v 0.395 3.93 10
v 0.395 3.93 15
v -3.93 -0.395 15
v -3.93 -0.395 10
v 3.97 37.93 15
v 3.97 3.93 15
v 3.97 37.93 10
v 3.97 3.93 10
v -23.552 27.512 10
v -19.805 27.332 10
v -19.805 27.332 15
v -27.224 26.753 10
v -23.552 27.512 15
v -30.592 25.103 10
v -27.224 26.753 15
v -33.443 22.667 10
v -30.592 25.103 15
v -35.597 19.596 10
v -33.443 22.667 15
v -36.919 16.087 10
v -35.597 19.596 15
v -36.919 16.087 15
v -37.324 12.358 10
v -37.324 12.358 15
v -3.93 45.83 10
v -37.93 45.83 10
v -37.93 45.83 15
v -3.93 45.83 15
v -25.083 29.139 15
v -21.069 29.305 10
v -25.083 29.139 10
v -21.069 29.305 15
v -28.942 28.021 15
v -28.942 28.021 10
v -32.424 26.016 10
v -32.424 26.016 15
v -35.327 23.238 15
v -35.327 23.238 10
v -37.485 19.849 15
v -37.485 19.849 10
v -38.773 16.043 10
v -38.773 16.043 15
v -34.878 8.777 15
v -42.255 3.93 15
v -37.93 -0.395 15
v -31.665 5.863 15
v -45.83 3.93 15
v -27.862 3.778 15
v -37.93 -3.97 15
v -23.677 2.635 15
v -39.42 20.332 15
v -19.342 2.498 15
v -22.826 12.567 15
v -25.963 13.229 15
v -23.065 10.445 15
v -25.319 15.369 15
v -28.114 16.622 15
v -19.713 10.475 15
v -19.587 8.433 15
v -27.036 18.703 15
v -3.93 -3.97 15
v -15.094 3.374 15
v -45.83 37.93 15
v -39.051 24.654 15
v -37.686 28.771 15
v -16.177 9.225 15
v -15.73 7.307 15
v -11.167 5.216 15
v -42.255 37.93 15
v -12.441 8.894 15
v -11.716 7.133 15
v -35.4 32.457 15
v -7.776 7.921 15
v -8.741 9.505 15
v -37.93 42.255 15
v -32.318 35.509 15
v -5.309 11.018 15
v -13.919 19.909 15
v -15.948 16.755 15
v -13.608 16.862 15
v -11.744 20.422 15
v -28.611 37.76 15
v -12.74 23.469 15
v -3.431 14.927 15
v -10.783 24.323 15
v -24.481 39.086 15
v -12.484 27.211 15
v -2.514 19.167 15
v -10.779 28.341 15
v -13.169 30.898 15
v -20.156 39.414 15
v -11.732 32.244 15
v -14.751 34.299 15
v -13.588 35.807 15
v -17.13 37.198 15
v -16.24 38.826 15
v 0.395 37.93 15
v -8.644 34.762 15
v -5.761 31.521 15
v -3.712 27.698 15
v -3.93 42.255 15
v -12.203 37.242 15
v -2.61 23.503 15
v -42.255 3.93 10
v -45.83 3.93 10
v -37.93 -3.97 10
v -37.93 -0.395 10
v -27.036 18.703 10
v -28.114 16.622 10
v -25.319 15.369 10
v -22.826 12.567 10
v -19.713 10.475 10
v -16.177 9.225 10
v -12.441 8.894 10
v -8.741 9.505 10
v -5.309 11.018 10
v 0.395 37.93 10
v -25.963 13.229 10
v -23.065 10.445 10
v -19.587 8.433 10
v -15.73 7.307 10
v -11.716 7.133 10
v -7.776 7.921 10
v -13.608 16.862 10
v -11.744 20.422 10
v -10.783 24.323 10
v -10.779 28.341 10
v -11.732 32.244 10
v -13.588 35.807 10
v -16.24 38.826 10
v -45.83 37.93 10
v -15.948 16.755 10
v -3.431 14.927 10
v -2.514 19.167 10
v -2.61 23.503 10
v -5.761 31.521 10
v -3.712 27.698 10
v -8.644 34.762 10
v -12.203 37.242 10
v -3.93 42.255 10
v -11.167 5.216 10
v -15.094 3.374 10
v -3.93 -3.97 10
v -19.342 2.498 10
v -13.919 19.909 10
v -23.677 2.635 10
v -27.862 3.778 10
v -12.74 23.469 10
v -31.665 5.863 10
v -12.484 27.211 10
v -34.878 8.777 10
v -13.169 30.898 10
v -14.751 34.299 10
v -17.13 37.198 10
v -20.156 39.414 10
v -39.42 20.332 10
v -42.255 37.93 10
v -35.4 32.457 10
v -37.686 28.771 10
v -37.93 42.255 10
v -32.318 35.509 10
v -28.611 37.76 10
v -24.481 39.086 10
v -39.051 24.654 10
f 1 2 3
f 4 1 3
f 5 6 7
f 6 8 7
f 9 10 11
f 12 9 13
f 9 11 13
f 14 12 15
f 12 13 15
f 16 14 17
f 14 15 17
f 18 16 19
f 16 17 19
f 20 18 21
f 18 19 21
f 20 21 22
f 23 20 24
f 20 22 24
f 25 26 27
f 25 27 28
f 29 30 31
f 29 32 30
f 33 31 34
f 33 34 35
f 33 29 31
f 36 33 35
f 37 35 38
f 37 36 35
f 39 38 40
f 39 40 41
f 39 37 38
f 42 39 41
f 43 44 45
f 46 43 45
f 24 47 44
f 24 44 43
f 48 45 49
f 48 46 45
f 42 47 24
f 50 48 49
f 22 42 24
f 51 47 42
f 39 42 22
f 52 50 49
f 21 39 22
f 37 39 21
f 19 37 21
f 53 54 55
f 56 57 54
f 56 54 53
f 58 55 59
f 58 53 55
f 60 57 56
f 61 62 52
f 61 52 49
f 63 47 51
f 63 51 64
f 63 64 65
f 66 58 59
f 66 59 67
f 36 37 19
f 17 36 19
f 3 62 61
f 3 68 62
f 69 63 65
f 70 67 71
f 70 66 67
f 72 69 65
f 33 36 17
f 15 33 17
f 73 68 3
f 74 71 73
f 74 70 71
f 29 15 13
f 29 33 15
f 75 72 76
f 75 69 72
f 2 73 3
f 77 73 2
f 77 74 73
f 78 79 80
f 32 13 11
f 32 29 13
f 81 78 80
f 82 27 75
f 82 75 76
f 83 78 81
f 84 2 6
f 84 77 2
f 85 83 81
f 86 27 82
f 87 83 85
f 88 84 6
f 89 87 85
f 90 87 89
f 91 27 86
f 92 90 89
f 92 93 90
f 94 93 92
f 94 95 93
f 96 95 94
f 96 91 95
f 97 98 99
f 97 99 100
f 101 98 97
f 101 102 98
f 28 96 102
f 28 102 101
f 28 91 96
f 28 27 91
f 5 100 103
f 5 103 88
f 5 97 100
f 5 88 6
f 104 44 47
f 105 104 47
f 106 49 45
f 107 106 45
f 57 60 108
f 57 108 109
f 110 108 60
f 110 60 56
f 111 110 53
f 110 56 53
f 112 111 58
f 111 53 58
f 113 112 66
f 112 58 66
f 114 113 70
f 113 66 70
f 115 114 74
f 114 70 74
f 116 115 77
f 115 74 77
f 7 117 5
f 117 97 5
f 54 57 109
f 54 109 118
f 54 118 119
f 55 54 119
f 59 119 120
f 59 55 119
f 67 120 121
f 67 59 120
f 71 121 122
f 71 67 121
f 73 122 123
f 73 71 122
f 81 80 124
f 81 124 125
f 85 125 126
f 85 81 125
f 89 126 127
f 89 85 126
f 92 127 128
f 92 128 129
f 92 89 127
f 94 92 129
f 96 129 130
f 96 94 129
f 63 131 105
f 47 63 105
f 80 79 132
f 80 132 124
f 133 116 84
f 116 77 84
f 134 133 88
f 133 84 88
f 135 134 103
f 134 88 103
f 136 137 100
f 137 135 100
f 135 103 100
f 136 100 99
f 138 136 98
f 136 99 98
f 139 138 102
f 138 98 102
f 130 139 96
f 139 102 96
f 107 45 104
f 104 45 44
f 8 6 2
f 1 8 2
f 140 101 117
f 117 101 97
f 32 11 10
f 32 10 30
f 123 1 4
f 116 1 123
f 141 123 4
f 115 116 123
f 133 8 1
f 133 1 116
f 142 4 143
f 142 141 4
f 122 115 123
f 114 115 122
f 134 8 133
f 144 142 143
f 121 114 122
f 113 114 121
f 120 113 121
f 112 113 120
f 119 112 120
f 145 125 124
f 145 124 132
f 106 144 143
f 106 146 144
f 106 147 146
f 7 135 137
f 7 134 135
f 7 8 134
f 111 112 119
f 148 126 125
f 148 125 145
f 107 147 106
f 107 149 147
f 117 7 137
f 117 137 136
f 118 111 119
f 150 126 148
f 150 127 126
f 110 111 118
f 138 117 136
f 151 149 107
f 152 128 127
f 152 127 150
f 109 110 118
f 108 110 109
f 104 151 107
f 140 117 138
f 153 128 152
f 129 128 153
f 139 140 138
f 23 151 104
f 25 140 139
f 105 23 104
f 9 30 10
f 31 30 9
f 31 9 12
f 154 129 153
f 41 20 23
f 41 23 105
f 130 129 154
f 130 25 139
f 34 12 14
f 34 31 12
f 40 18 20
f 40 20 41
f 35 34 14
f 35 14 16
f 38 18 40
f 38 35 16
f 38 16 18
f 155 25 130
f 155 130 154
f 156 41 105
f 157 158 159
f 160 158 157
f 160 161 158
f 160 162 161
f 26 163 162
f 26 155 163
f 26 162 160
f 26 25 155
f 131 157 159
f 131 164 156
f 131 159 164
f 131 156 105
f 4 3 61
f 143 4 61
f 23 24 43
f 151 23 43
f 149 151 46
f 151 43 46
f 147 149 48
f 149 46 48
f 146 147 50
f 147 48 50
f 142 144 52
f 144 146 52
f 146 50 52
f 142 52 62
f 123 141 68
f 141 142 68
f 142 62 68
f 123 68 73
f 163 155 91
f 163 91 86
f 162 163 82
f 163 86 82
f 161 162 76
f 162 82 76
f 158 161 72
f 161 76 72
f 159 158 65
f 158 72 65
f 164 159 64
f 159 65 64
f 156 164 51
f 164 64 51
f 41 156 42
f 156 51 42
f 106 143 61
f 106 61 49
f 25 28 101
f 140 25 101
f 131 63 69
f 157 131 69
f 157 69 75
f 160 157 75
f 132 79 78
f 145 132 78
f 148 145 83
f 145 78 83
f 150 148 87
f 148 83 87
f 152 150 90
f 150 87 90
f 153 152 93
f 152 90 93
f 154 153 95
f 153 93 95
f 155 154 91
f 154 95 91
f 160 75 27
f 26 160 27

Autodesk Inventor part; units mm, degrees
ref_plane "YZ Plane" through (0, 0, 0) normal (1, 0, 0) x (0, 1, 0)
ref_plane "Work Plane1" through (0, 0, 10) normal (0, 0, 1) x (1, 0, 0)
sketch "Sketch1" plane through (0, 0, 10) normal (0, 0, 1) x (1, 0, 0)
  line L0 (-4.0299, -0.3538) -> (-2.2322, 1.4439) construction
  arc A0 (-1.4439, 2.2322) -> (-2.2322, 1.4439) centre (-0.9299, 0.9299) ccw construction
  line L1 (-1.4439, 2.2322) -> (0.3538, 4.0299) construction
  line L2 (-37.8299, 42.2137) -> (-37.8299, 45.8299) construction
  line L3 (-37.8299, 45.8299) -> (-4.0299, 45.8299) construction
  line L4 (-4.0299, 45.8299) -> (-4.0299, 42.2137) construction
  line L5 (-4.0299, 4.0299) -> (0.3538, 4.0299) projected
  line L6 (-20.9299, 58.9723) -> (17.1124, 20.9299) construction
  line L7 (17.1124, 20.9299) -> (-20.9299, -17.1124) construction
  line L8 (-20.9299, -17.1124) -> (-58.9723, 20.9299) construction
  line L9 (-58.9723, 20.9299) -> (-20.9299, 58.9723) construction
  line L10 (-20.9299, 58.9723) -> (-20.9299, -17.1124) construction
  line L11 (17.1124, 20.9299) -> (-58.9723, 20.9299) construction
  line L12 (-20.9299, 58.9723) -> (32.8701, 58.9723) construction
  line L13 (-43.4299, 43.4299) -> (1.5701, 43.4299) construction
  line L14 (1.5701, 43.4299) -> (1.5701, -1.5701) construction
  line L15 (1.5701, -1.5701) -> (-43.4299, -1.5701) construction
  line L16 (-43.4299, -1.5701) -> (-43.4299, 43.4299) construction
  line L17 (-43.4299, 43.4299) -> (1.5701, -1.5701) construction
  line L18 (1.5701, 43.4299) -> (-43.4299, -1.5701) construction
  line L19 (-43.4299, 5.3876) -> (-43.4299, 36.4723)
  line L20 (-43.4299, 36.4723) -> (-36.4723, 43.4299)
  line L21 (-36.4723, 43.4299) -> (-5.3876, 43.4299)
  line L22 (-5.3876, 43.4299) -> (1.5701, 36.4723)
  line L23 (1.5701, 36.4723) -> (1.5701, 5.3876)
  line L24 (1.5701, 5.3876) -> (-5.3876, -1.5701)
  line L25 (-5.3876, -1.5701) -> (-36.4723, -1.5701)
  line L26 (-36.4723, -1.5701) -> (-43.4299, 5.3876)
  line L27 (-4.0299, 42.2137) -> (-37.8299, 42.2137) projected
  line L28 (-4.0299, -0.3538) -> (-4.0299, 4.0299) projected
  circle A1 centre (-20.9299, 20.9299) radius 13.3985
  circle A2 centre (-20.9299, 20.9299) radius 15.4895
  point P0 (-37.8299, 4.0299)
  dimension "d18" = 53.8
  dimension "d19" = 45
  dimension "d20" = 53.8
  dimension "d21" = 45
  dimension "d22" = 45
  dimension "d30" = 26.797
  dimension "d36" = 30.979
extrude "Extrusion1" add sketch "Sketch1" along normal blind 5 contours L28 L24 L25 L26 L19 L20 L27 L22 L23 L5 | L5 L24 L28 | L27 L20 L21 L22 | A1 | A2
ref_plane "Work Plane2" through (-40.9959, 0.8639, 22.2359) normal (0, 0, 1) x (1, 0, 0)
sketch "Sketch3" plane through (0, 0, 10) normal (0, 0, -1) x (-1, 0, 0)
  line L0 (37.8299, -0.4701) -> (37.8299, 4.0299) construction
  line L1 (4.0299, 4.0299) -> (4.0299, -0.4701) construction
  line L2 (37.8299, -0.4701) -> (37.8299, 1.1886) construction
  line L3 (4.0299, -3.9701) -> (4.0299, -0.3538) construction
  line L4 (45.8299, 4.0299) -> (42.2137, 4.0299) construction
  line L5 (-0.3538, 4.0299) -> (-3.9701, 4.0299) construction
  line L6 (-3.9701, 37.8299) -> (-0.3538, 37.8299) construction
  line L7 (4.0299, 42.2137) -> (4.0299, 45.8299) construction
  line L8 (37.8299, 45.8299) -> (37.8299, 42.2137) construction
  line L9 (42.2137, 37.8299) -> (45.8299, 37.8299) construction
  line L10 (37.8299, 37.7299) -> (45.8299, 37.7299)
  line L11 (45.8299, 37.7299) -> (45.8299, 4.1299)
  line L12 (45.8299, 4.1299) -> (37.8299, 4.1299)
  line L13 (37.8299, 4.1299) -> (37.8299, 37.7299)
  line L14 (37.7299, 4.0299) -> (4.1299, 4.0299)
  line L15 (4.1299, 4.0299) -> (4.1299, -3.9701)
  line L16 (4.1299, -3.9701) -> (37.7299, -3.9701)
  line L17 (37.7299, -3.9701) -> (37.7299, 4.0299)
  line L18 (4.0299, 4.1299) -> (-3.9701, 4.1299)
  line L19 (-3.9701, 4.1299) -> (-3.9701, 37.7299)
  line L20 (-3.9701, 37.7299) -> (4.0299, 37.7299)
  line L21 (4.0299, 37.7299) -> (4.0299, 4.1299)
  line L22 (4.1299, 37.8299) -> (37.7299, 37.8299)
  line L23 (37.7299, 37.8299) -> (37.7299, 45.8299)
  line L24 (37.7299, 45.8299) -> (4.1299, 45.8299)
  line L25 (4.1299, 45.8299) -> (4.1299, 37.8299)
  point P0 (0, 0)
  dimension "d23" = 0.1
  dimension "d24" = 0.1
  dimension "d25" = 0.1
  dimension "d26" = 0.1
  dimension "d27" = 0.1
extrude "Extrusion3" add sketch "Sketch3" against normal up to surface (5 mm away)
sketch "Sketch6" plane through (0, 0, 15) normal (0, 0, 1) x (1, 0, 0)
  circle A0 centre (-20.9299, 20.9299) radius 18.5
  circle A1 centre (-20.9299, 20.9299) radius 13.3985
  line L0 (-45.8299, 4.1299) -> (-45.8299, 37.7299) projected
  line L1 (-4.1299, -3.9701) -> (-37.7299, -3.9701) projected
  line L2 (-37.7299, 45.8299) -> (-4.1299, 45.8299) projected
  point P0 (0, 0)
  point P1 (-45.8299, 20.9299)
  point P2 (-20.9299, -3.9701)
  point P3 (-20.9299, 45.8299)
  dimension "d37" = 26.797
  dimension "d38" = 37
extrude "Extrusion5" cut sketch "Sketch6" against normal blind 12 contours A0 | A1
sketch "Sketch7" plane through (0, 0, 15) normal (0, 0, 1) x (1, 0, 0)
  arc A0 (-7.3514, 4.1907) -> (-4.1915, 7.0829) centre (-15.9478, 16.7551) ccw
  arc A1 (-7.3514, 4.1907) -> (-4.1915, 7.0829) centre (-15.9478, 16.7551) ccw
  circle A2 centre (-20.9299, 20.9299) radius 18.5 construction
  circle A3 centre (-20.9299, 20.9299) radius 6.5 construction
  arc A4 (-15.9478, 16.7551) -> (-20.1559, 39.4137) centre (-27.3968, 26.3489) ccw
  arc A5 (-13.6076, 16.8625) -> (-16.2405, 38.8257) centre (-27.3968, 26.3489) ccw
  arc A6 (-16.2405, 38.8257) -> (-20.1559, 39.4137) centre (-20.9299, 20.9299) ccw
  line L0 (-15.9478, 16.7551) -> (-13.6076, 16.8625)
  point P0 (0, 0)
  point P1 (-25.3654, 35.7708)
  point P2 (-14.2, -44.8454)
  point P3 (-13.5804, 16.4347)
  point P4 (-13.5804, 8.5029)
  dimension "d79" = 13
  dimension "d83" = 1.8
extrude "Extrusion6" add sketch "Sketch7" against normal up to surface (5 mm away)
pattern_circular "Circular Pattern1" count 3 over 360 about axis through (-20.9299, 20.9299, 15) along (0, 0, -1) of "Extrusion6"
sketch "Skizze11" plane through (0, 0, 15) normal (0, 0, 1) x (1, 0, 0)
  arc A0 (-5.3095, 11.0177) -> (-16.2405, 38.8257) centre (-20.9299, 20.9299) ccw construction
  arc A1 (-27.0364, 18.7027) -> (-5.3095, 11.0177) centre (-13.0035, 23.8209) ccw construction
  line L0 (-28.1135, 16.6223) -> (-27.0364, 18.7027) construction
  arc A2 (-28.1135, 16.6223) -> (-7.7764, 7.9209) centre (-13.0035, 23.8209) ccw construction
  arc A3 (-37.3244, 12.3584) -> (-7.7764, 7.9209) centre (-20.9299, 20.9299) ccw construction
  arc A4 (-19.8055, 27.3319) -> (-37.3244, 12.3584) centre (-22.3895, 12.6199) ccw construction
  line L1 (-21.0686, 29.3049) -> (-19.8055, 27.3319) construction
  arc A5 (-21.0686, 29.3049) -> (-38.7728, 16.0432) centre (-22.3895, 12.6199) ccw construction
  arc A6 (-20.1559, 39.4137) -> (-38.7728, 16.0432) centre (-20.9299, 20.9299) ccw construction
  arc A7 (-15.9478, 16.7551) -> (-20.1559, 39.4137) centre (-27.3968, 26.3489) ccw construction
  line L2 (-13.6076, 16.8625) -> (-15.9478, 16.7551) construction
  arc A8 (-13.6076, 16.8625) -> (-16.2405, 38.8257) centre (-27.3968, 26.3489) ccw construction
  line L3 (3.9701, 4.1299) -> (0.3124, 4.1299) projected
  line L4 (3.9701, 37.7299) -> (3.9701, 4.1299) construction
  line L5 (0.3124, 37.7299) -> (3.9701, 37.7299) projected
  line L6 (0.3124, 37.7299) -> (-4.1299, 42.1723) projected
  line L7 (-4.1299, 45.8299) -> (-4.1299, 42.1723) projected
  line L8 (-37.7299, 45.8299) -> (-4.1299, 45.8299) construction
  line L9 (-37.7299, 42.1723) -> (-37.7299, 45.8299) projected
  line L10 (-37.7299, 42.1723) -> (-42.1723, 37.7299) projected
  line L11 (-45.8299, 37.7299) -> (-42.1723, 37.7299) projected
  line L12 (-45.8299, 4.1299) -> (-45.8299, 37.7299) construction
  line L13 (-42.1723, 4.1299) -> (-45.8299, 4.1299) projected
  line L14 (-42.1723, 4.1299) -> (-37.7299, -0.3124) projected
  line L15 (-37.7299, -3.9701) -> (-37.7299, -0.3124) projected
  line L16 (-4.1299, -3.9701) -> (-37.7299, -3.9701) construction
  line L17 (-4.1299, -0.3124) -> (-4.1299, -3.9701) projected
  line L18 (-4.1299, -0.3124) -> (0.3124, 4.1299) projected
  line L19 (-3.9299, 46.0299) -> (-3.9299, 42.2551)
  line L20 (-3.9299, 42.2551) -> (0.3953, 37.9299)
  line L21 (0.3953, 37.9299) -> (4.1701, 37.9299)
  line L22 (4.1701, 37.9299) -> (4.1701, 3.9299) construction
  line L23 (4.1701, 3.9299) -> (0.3953, 3.9299)
  line L24 (0.3953, 3.9299) -> (-3.9299, -0.3953)
  line L25 (-3.9299, -0.3953) -> (-3.9299, -4.1701)
  line L26 (-3.9299, -4.1701) -> (-37.9299, -4.1701) construction
  line L27 (-37.9299, -4.1701) -> (-37.9299, -0.3953)
  line L28 (-37.9299, -0.3953) -> (-42.2551, 3.9299)
  line L29 (-42.2551, 3.9299) -> (-46.0299, 3.9299)
  line L30 (-46.0299, 3.9299) -> (-46.0299, 37.9299) construction
  line L31 (-46.0299, 37.9299) -> (-42.2551, 37.9299)
  line L32 (-42.2551, 37.9299) -> (-37.9299, 42.2551)
  line L33 (-37.9299, 42.2551) -> (-37.9299, 46.0299)
  line L34 (-37.9299, 46.0299) -> (-3.9299, 46.0299) construction
  line L35 (-45.8299, 37.7299) -> (-45.8299, 37.9299)
  line L36 (-37.7299, 45.8299) -> (-37.9299, 45.8299)
  line L37 (-4.1299, 45.8299) -> (-3.9299, 45.8299)
  line L38 (3.9701, 37.7299) -> (3.9701, 37.9299)
  line L39 (3.9701, 37.7299) -> (3.9701, 4.1299) projected
  line L40 (3.9701, 4.1299) -> (3.9701, 3.9299)
  line L41 (-4.1299, -3.9701) -> (-3.9299, -3.9701)
  line L42 (-37.7299, -3.9701) -> (-37.9299, -3.9701)
  line L43 (-45.8299, 4.1299) -> (-45.8299, 3.9299)
  point P0 (0, 0)
  dimension "d84" = 0.2
extrude "IM_offset" add sketch "Skizze11" against normal up to surface (5 mm away)
properties part number "20_Cube_Insert_Objective_Holder_v3"
